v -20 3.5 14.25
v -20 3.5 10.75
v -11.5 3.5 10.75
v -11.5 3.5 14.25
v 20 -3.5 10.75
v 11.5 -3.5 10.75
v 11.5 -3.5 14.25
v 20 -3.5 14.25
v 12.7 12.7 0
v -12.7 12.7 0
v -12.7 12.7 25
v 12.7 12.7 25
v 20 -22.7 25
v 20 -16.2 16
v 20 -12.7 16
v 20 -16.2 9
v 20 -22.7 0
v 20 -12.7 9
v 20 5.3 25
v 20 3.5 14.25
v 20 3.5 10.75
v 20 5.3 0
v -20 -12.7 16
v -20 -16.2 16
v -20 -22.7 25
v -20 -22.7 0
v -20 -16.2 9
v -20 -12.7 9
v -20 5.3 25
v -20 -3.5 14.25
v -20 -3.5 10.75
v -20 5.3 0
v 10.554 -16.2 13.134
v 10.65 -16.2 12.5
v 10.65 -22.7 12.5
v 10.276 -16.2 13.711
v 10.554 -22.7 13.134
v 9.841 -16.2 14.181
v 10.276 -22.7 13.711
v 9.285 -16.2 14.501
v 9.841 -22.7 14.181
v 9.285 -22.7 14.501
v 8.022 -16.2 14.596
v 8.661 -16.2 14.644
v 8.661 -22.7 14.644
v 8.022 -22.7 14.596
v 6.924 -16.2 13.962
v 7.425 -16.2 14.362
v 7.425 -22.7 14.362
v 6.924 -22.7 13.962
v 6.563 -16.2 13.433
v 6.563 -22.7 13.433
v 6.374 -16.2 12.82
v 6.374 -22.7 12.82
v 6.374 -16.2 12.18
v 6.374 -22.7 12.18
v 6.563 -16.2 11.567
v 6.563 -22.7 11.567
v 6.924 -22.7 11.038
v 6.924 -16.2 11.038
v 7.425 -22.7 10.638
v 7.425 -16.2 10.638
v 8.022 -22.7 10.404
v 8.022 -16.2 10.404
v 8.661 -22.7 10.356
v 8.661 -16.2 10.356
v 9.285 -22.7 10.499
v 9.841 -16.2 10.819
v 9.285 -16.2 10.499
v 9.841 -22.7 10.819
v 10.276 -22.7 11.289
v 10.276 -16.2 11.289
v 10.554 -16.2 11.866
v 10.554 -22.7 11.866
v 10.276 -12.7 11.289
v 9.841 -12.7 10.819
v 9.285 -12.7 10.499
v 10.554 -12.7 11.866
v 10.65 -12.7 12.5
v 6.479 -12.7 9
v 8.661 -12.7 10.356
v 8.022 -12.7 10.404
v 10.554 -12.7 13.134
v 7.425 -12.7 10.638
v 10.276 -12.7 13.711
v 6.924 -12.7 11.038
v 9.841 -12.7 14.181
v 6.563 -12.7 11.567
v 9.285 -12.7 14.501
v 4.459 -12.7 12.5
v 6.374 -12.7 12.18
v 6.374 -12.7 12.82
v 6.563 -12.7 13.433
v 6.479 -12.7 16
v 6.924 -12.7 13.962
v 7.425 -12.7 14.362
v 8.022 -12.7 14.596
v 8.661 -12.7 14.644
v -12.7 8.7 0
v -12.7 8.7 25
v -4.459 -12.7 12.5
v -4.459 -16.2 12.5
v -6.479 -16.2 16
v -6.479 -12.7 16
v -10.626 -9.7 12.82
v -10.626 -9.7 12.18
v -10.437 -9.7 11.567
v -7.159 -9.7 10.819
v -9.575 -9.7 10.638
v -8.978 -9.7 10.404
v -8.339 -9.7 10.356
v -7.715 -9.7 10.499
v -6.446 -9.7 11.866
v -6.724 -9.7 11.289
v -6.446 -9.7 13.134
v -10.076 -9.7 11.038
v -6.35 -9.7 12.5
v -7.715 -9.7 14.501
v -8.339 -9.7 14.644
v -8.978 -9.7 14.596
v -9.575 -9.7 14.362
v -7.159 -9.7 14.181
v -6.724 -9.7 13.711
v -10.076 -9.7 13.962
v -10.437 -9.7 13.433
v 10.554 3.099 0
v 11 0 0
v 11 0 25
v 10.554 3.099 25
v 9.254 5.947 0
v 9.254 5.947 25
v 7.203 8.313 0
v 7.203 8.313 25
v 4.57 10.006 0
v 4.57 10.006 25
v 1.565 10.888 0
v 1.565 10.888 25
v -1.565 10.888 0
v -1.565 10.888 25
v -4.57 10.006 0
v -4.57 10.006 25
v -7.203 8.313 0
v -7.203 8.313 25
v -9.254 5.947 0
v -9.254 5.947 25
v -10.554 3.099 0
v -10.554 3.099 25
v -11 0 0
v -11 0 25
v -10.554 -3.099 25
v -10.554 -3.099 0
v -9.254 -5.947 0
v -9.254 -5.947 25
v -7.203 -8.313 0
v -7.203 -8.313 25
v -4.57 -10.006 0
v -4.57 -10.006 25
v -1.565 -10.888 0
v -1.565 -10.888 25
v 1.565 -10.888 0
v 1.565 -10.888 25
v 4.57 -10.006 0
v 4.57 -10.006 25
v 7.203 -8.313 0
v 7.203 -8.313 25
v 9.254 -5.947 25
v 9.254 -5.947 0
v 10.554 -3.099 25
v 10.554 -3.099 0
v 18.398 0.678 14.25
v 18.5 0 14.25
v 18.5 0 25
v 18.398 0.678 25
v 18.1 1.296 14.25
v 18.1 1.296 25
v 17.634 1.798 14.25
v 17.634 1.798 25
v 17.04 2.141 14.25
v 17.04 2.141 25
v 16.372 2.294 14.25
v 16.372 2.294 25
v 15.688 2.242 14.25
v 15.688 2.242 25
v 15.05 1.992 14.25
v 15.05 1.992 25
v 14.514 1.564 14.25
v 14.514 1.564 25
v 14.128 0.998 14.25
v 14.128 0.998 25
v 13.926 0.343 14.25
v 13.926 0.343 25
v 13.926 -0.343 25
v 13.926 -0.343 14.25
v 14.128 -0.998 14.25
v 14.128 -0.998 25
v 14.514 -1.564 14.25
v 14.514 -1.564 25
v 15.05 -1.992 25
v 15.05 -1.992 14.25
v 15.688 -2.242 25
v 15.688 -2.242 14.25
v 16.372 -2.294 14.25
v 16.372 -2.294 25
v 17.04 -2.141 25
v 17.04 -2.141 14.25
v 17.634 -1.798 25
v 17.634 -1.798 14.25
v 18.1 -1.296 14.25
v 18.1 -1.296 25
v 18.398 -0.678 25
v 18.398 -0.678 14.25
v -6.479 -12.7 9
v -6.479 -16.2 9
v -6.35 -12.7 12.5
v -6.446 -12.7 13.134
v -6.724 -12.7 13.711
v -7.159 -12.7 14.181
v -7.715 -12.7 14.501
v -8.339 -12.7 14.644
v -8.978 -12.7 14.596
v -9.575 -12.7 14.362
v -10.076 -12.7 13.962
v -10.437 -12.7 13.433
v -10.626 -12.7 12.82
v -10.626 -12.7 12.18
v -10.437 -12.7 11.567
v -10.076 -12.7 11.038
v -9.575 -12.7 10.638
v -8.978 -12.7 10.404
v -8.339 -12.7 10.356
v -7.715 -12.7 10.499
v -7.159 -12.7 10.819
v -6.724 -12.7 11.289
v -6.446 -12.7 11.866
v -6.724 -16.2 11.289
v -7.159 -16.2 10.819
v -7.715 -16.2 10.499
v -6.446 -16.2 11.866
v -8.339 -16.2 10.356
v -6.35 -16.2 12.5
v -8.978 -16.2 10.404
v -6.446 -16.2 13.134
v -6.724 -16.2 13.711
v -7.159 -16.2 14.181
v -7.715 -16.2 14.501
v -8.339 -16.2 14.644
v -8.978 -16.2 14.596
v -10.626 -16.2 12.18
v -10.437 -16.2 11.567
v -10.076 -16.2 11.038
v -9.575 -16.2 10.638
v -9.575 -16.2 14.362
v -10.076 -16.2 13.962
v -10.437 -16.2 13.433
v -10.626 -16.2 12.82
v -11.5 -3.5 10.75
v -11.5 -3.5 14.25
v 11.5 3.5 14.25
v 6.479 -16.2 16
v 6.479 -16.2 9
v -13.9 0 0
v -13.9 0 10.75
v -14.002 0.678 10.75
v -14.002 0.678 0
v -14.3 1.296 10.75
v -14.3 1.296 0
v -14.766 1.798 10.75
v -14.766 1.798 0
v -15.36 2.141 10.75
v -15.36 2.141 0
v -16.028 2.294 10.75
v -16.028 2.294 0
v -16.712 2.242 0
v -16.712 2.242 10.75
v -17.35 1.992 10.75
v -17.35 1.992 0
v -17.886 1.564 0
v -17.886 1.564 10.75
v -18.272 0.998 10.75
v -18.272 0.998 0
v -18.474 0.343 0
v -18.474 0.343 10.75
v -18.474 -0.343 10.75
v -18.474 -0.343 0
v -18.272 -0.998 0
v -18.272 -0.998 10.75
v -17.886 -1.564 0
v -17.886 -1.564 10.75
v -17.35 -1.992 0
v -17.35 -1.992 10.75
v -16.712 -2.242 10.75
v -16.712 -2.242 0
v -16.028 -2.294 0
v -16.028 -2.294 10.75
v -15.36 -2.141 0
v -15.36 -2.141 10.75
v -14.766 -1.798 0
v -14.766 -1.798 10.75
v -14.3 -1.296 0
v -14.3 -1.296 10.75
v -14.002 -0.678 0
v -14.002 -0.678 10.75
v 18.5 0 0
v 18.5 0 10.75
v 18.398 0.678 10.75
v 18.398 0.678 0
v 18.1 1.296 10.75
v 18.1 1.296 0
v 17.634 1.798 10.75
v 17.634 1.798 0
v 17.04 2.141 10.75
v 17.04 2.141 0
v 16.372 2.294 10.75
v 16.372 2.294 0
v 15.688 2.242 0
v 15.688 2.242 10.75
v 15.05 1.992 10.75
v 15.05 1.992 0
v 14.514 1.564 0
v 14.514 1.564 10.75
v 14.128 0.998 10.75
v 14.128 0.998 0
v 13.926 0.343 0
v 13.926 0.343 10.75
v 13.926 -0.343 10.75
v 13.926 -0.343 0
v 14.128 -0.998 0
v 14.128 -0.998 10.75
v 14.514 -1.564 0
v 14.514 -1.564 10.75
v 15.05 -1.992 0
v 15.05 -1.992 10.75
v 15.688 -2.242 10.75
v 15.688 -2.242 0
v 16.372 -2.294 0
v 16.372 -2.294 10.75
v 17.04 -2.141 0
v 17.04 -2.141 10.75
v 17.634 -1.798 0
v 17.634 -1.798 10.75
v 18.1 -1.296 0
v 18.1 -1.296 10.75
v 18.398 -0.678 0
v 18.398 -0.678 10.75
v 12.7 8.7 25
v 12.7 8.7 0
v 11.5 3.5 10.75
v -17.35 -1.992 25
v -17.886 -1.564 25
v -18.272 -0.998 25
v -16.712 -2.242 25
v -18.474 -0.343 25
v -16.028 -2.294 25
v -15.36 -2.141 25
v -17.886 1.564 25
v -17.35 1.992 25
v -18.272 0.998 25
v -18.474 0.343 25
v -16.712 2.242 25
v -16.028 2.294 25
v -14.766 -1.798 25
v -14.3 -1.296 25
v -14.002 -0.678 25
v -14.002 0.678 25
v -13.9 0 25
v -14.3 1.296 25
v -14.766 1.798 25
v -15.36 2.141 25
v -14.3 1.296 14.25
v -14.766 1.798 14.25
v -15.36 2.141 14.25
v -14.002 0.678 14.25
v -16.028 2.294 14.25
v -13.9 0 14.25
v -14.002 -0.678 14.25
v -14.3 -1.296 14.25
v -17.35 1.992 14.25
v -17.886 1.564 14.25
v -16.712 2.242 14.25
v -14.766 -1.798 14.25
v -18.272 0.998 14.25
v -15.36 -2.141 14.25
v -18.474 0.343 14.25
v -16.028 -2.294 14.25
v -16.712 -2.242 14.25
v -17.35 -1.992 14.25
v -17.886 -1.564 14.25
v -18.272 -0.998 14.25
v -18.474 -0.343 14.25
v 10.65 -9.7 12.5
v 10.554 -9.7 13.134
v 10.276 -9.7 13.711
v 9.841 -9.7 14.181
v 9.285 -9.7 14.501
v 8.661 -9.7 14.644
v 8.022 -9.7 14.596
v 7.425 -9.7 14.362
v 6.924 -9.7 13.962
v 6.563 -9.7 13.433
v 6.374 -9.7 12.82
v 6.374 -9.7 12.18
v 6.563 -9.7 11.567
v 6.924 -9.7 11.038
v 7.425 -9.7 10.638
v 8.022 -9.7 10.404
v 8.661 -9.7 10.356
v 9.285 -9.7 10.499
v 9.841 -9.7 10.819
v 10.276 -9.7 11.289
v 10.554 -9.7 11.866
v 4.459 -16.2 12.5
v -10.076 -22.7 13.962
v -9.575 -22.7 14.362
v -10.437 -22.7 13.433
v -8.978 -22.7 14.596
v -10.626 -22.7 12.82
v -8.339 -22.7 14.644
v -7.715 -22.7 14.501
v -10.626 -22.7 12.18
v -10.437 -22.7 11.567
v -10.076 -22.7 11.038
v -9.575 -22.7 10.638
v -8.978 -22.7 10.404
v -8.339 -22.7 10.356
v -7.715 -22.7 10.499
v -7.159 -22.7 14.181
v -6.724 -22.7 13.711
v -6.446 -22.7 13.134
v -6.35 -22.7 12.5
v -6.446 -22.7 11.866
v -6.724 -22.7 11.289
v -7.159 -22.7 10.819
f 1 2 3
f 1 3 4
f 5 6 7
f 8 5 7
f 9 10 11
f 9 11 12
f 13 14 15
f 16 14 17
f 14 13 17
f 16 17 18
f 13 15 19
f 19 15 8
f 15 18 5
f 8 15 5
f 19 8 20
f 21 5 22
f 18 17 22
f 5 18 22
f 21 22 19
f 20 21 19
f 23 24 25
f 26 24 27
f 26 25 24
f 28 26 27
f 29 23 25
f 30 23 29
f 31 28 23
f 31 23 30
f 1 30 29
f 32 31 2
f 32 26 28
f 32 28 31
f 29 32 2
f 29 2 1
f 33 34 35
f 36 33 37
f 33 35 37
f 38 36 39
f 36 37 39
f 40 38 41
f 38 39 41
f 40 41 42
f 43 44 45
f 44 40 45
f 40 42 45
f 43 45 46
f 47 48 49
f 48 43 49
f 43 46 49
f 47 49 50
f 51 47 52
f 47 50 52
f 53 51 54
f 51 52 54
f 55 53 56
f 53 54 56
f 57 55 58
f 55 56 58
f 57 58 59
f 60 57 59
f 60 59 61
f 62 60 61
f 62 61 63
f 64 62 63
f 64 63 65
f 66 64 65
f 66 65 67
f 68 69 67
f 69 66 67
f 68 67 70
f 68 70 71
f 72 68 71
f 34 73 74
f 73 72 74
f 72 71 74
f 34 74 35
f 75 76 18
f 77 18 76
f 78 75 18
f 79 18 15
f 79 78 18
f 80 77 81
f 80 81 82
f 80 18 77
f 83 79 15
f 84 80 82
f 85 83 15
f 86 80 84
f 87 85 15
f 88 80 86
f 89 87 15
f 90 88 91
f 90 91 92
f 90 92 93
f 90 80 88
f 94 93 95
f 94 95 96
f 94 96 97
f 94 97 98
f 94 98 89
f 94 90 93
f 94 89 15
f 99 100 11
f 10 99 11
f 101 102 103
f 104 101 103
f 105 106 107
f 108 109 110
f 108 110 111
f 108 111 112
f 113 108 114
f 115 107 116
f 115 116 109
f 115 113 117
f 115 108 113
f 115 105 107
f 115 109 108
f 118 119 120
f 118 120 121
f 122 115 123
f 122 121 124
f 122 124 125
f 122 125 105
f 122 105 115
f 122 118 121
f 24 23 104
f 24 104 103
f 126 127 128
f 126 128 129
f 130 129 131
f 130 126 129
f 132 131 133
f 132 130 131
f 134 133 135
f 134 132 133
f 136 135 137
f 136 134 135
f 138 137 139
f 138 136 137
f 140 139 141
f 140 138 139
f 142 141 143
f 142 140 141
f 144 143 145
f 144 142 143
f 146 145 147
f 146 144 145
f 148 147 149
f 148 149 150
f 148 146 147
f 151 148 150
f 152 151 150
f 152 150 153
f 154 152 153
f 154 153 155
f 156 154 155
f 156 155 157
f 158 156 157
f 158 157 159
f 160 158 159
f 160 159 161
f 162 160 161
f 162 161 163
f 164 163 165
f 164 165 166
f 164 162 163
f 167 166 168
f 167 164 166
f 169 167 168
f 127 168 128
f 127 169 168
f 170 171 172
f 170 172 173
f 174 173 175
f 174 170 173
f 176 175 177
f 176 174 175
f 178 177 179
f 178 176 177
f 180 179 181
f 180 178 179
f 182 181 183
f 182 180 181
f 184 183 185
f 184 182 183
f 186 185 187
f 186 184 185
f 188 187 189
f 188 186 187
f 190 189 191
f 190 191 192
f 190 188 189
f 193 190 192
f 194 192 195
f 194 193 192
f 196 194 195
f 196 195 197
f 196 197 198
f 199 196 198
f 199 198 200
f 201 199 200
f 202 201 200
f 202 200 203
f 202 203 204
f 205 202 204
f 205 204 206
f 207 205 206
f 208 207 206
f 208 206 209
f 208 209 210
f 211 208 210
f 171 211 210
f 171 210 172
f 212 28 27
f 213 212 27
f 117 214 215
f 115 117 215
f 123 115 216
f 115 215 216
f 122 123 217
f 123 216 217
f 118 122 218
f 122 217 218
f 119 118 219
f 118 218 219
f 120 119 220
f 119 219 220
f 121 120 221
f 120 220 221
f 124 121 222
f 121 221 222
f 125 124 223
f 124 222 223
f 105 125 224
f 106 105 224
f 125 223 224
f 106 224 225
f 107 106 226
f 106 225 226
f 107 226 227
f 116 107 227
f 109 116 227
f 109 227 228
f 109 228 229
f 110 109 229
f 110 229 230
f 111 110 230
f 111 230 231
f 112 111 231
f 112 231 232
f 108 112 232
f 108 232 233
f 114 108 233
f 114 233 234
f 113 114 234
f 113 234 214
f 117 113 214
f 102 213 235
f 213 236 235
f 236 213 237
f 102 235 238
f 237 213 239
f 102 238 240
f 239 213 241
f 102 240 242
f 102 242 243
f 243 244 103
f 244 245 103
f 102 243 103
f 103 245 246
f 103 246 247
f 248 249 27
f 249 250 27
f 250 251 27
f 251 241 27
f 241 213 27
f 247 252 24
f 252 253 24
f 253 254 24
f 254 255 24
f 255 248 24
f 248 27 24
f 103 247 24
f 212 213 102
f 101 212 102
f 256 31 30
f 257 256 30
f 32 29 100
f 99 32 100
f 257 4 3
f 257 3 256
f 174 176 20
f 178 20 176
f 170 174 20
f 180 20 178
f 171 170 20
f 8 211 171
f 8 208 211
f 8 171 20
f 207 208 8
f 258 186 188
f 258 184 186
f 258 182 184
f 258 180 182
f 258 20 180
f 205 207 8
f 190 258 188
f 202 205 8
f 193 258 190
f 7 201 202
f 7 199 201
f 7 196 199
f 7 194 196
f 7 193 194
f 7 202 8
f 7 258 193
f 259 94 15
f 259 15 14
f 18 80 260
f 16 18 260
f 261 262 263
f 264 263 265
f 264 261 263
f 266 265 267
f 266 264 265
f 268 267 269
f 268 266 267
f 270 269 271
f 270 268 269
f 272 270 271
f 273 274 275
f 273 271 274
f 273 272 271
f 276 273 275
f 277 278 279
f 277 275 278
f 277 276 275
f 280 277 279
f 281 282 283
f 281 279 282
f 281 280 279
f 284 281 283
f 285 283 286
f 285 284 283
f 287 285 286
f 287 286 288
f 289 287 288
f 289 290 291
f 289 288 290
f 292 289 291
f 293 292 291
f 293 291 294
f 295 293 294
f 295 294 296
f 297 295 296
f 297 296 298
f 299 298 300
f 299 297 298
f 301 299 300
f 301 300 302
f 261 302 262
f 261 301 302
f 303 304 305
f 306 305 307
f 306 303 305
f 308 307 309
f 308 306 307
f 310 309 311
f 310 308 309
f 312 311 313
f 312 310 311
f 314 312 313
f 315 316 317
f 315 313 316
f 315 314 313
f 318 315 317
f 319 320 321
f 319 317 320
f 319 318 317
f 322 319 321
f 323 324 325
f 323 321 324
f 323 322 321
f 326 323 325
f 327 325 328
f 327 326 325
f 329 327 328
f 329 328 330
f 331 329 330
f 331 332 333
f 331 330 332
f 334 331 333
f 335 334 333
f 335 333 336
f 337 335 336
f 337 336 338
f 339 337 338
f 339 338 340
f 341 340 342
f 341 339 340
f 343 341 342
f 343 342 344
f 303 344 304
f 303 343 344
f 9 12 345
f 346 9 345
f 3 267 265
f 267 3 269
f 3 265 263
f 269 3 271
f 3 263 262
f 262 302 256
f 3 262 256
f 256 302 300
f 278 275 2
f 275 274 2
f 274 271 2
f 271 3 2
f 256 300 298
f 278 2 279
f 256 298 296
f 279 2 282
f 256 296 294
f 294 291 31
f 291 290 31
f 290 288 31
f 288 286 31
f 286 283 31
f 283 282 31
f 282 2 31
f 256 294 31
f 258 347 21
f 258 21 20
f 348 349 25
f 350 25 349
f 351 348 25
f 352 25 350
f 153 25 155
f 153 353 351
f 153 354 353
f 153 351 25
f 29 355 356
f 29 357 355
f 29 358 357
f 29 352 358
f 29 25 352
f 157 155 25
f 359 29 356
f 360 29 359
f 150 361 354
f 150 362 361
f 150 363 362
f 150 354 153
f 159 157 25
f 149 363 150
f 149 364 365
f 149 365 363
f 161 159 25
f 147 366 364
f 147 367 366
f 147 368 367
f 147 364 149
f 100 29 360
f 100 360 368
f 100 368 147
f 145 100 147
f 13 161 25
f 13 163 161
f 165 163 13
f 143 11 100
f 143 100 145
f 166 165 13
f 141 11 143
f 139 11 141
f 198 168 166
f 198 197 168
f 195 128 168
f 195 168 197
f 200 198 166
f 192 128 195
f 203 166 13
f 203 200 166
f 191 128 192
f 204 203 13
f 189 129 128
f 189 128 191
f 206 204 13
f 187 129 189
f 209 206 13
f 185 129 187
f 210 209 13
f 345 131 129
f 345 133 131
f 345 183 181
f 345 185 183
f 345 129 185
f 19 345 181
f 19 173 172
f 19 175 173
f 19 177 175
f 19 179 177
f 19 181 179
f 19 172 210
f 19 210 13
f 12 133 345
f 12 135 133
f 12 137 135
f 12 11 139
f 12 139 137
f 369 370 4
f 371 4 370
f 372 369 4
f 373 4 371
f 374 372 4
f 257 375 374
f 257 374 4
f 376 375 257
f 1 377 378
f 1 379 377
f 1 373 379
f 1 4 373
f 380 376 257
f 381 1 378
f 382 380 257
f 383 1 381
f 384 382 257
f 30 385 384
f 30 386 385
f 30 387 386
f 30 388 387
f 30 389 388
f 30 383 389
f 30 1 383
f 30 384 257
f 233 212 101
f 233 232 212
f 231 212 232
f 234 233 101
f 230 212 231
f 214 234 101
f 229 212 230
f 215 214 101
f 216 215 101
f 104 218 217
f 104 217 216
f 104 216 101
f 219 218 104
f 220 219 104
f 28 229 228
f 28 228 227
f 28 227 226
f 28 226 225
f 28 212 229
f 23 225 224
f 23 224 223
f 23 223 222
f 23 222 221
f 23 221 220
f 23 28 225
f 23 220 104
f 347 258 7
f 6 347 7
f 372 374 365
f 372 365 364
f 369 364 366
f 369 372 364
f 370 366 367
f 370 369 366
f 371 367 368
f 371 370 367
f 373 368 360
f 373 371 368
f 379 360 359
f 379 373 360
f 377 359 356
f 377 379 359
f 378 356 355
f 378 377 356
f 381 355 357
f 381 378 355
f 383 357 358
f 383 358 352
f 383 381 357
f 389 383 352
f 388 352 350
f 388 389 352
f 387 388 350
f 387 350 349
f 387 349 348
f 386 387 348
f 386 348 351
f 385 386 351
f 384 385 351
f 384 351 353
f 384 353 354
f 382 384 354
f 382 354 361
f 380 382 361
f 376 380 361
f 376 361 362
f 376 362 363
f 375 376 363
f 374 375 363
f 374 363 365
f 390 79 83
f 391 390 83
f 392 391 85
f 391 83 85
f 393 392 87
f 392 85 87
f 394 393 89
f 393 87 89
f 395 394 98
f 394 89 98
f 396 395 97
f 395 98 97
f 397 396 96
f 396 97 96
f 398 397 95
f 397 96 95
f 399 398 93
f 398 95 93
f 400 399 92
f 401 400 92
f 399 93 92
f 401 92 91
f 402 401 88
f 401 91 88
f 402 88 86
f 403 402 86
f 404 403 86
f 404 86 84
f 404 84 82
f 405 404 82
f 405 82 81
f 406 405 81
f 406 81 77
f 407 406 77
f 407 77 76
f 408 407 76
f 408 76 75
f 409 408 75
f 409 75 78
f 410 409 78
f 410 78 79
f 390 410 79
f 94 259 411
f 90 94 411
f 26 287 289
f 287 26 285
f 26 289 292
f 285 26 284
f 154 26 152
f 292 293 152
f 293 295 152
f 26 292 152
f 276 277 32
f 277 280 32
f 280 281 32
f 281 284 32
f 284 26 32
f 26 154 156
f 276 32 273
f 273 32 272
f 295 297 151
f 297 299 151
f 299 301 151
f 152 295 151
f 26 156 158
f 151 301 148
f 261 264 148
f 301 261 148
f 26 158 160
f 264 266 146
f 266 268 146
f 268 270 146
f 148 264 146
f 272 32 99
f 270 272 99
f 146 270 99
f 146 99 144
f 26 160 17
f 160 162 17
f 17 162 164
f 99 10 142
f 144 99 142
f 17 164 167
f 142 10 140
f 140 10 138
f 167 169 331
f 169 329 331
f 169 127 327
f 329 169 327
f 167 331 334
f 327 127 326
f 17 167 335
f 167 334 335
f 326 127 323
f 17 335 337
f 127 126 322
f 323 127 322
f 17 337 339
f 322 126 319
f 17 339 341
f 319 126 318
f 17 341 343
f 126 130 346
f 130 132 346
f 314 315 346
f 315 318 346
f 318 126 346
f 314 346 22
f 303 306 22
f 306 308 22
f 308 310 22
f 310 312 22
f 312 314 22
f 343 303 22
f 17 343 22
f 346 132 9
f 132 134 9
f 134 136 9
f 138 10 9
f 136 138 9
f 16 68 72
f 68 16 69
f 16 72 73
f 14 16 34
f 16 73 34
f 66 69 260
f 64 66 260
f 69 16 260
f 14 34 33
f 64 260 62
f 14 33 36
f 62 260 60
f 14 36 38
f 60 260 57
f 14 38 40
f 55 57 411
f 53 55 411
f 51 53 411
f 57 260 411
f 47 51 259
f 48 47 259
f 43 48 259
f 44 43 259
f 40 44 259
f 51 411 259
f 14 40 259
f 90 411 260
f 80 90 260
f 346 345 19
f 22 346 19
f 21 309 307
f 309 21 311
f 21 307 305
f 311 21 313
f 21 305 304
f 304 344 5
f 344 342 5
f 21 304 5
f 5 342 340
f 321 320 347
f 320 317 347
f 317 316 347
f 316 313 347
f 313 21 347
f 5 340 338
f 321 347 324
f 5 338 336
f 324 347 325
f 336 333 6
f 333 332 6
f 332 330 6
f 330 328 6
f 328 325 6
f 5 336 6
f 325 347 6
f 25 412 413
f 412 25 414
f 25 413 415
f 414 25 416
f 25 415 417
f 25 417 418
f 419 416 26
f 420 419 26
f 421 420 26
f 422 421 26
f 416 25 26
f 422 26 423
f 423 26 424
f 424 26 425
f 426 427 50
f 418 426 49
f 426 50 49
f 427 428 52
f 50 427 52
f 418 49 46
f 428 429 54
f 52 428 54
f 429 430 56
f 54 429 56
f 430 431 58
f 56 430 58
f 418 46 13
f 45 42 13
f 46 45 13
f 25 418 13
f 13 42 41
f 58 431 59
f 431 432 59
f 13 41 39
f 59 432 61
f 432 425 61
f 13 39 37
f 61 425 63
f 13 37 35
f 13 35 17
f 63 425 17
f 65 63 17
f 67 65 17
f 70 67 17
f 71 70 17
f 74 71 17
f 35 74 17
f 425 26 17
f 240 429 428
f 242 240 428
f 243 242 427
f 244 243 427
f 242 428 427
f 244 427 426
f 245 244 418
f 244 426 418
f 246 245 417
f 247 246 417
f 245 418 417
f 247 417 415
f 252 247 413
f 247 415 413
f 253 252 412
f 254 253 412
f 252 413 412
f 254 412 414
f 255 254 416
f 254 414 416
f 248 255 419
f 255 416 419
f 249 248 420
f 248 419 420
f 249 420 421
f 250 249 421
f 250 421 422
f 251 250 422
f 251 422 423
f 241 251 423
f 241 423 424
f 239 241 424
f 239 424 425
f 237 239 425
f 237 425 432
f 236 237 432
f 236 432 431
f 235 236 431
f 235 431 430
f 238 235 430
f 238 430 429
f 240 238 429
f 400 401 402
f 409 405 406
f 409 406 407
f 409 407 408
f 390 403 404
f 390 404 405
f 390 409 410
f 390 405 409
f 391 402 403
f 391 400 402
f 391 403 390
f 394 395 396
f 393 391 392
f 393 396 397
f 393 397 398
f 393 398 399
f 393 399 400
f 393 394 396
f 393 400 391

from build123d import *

# Parameters (mm, degrees)
F0_W      = 40
F0_H      = 35.4
F0_R      = 2.3
F0_R_2    = 11
F1_DEPTH  = 25
F2_R      = 2.15
F3_DEPTH  = 13
F5_START  = -6.5
F5_DEPTH  = 3.5
F6_W      = 3.5
F6_H      = 7
F7_DEPTH  = 10
F8_START  = -27
F8_DEPTH  = 23
F10_W     = 7
F10_H     = 3.5
F11_DEPTH = 8.5
F12_START = -31.5
F12_DEPTH = 18.5
F13_DEPTH = 25


with BuildPart() as f1:
    # F0 (on Top) → F1 (new body)
    with BuildSketch(Plane.XY):
        with Locations((0, -5)):
            Rectangle(F0_W, F0_H)
        with Locations((-16.2, 0)):
            Circle(F0_R, mode=Mode.SUBTRACT)
        Circle(F0_R_2, mode=Mode.SUBTRACT)
        with Locations((16.2, 0)):
            Circle(F0_R, mode=Mode.SUBTRACT)
    extrude(amount=F1_DEPTH)

    # F2 (on face) → F3 (cut)
    with BuildSketch(Plane.XZ.offset(22.7)):
        with Locations((-8.5, 12.5)):
            Circle(F2_R)
        with Locations((8.5, 12.5)):
            Circle(F2_R)
    extrude(amount=-F3_DEPTH, mode=Mode.SUBTRACT)

    # F4 (on face) → F5 (cut)
    with BuildSketch(Plane.XZ.offset(22.7).offset(F5_START)):
        Polygon((-6.4792740578, 16), (-10.5207259422, 16), (-12.5414518843, 12.5), (-10.5207259422, 9), (-6.4792740578, 9), (-4.4585481157, 12.5), align=None)
        Polygon((12.5414518843, 12.5), (10.5207259422, 16), (6.4792740578, 16), (4.4585481157, 12.5), (6.4792740578, 9), (10.5207259422, 9), align=None)
    extrude(amount=-F5_DEPTH, mode=Mode.SUBTRACT)

    # F6 (on face) → F7 (cut)
    with BuildSketch(Plane(origin=(-20, 0, 0), x_dir=(0, -1, 0), z_dir=(-1, 0, 0))):
        with Locations((14.45, 12.5)):
            Rectangle(F6_W, F6_H)
    extrude(amount=-F7_DEPTH, mode=Mode.SUBTRACT)

    # F6 (on face) → F8 (cut)
    with BuildSketch(Plane(origin=(-20, 0, 0), x_dir=(0, -1, 0), z_dir=(-1, 0, 0)).offset(F8_START)):
        with Locations((14.45, 12.5)):
            Rectangle(F6_W, F6_H)
    extrude(amount=-F8_DEPTH, mode=Mode.SUBTRACT)

    # F10 (on face) → F11 (cut)
    with BuildSketch(Plane(origin=(-20, 0, 0), x_dir=(0, -1, 0), z_dir=(-1, 0, 0))):
        with Locations((0, 12.5)):
            Rectangle(F10_W, F10_H)
    extrude(amount=-F11_DEPTH, mode=Mode.SUBTRACT)

    # F10 (on face) → F12 (cut)
    with BuildSketch(Plane(origin=(-20, 0, 0), x_dir=(0, -1, 0), z_dir=(-1, 0, 0)).offset(F12_START)):
        with Locations((0, 12.5)):
            Rectangle(F10_W, F10_H)
    extrude(amount=-F12_DEPTH, mode=Mode.SUBTRACT)

    # F9 (on face) → F13 (cut)
    with BuildSketch(Plane.XY.offset(25)):
        Polygon((-20, 5.3), (-12.7, 8.7), (-12.7, 12.7), (-20, 12.7), align=None)
        Polygon((20, 12.7), (12.7, 12.7), (12.7, 8.7), (20, 5.3), align=None)
    extrude(amount=-F13_DEPTH, mode=Mode.SUBTRACT)


solid = f1.part
